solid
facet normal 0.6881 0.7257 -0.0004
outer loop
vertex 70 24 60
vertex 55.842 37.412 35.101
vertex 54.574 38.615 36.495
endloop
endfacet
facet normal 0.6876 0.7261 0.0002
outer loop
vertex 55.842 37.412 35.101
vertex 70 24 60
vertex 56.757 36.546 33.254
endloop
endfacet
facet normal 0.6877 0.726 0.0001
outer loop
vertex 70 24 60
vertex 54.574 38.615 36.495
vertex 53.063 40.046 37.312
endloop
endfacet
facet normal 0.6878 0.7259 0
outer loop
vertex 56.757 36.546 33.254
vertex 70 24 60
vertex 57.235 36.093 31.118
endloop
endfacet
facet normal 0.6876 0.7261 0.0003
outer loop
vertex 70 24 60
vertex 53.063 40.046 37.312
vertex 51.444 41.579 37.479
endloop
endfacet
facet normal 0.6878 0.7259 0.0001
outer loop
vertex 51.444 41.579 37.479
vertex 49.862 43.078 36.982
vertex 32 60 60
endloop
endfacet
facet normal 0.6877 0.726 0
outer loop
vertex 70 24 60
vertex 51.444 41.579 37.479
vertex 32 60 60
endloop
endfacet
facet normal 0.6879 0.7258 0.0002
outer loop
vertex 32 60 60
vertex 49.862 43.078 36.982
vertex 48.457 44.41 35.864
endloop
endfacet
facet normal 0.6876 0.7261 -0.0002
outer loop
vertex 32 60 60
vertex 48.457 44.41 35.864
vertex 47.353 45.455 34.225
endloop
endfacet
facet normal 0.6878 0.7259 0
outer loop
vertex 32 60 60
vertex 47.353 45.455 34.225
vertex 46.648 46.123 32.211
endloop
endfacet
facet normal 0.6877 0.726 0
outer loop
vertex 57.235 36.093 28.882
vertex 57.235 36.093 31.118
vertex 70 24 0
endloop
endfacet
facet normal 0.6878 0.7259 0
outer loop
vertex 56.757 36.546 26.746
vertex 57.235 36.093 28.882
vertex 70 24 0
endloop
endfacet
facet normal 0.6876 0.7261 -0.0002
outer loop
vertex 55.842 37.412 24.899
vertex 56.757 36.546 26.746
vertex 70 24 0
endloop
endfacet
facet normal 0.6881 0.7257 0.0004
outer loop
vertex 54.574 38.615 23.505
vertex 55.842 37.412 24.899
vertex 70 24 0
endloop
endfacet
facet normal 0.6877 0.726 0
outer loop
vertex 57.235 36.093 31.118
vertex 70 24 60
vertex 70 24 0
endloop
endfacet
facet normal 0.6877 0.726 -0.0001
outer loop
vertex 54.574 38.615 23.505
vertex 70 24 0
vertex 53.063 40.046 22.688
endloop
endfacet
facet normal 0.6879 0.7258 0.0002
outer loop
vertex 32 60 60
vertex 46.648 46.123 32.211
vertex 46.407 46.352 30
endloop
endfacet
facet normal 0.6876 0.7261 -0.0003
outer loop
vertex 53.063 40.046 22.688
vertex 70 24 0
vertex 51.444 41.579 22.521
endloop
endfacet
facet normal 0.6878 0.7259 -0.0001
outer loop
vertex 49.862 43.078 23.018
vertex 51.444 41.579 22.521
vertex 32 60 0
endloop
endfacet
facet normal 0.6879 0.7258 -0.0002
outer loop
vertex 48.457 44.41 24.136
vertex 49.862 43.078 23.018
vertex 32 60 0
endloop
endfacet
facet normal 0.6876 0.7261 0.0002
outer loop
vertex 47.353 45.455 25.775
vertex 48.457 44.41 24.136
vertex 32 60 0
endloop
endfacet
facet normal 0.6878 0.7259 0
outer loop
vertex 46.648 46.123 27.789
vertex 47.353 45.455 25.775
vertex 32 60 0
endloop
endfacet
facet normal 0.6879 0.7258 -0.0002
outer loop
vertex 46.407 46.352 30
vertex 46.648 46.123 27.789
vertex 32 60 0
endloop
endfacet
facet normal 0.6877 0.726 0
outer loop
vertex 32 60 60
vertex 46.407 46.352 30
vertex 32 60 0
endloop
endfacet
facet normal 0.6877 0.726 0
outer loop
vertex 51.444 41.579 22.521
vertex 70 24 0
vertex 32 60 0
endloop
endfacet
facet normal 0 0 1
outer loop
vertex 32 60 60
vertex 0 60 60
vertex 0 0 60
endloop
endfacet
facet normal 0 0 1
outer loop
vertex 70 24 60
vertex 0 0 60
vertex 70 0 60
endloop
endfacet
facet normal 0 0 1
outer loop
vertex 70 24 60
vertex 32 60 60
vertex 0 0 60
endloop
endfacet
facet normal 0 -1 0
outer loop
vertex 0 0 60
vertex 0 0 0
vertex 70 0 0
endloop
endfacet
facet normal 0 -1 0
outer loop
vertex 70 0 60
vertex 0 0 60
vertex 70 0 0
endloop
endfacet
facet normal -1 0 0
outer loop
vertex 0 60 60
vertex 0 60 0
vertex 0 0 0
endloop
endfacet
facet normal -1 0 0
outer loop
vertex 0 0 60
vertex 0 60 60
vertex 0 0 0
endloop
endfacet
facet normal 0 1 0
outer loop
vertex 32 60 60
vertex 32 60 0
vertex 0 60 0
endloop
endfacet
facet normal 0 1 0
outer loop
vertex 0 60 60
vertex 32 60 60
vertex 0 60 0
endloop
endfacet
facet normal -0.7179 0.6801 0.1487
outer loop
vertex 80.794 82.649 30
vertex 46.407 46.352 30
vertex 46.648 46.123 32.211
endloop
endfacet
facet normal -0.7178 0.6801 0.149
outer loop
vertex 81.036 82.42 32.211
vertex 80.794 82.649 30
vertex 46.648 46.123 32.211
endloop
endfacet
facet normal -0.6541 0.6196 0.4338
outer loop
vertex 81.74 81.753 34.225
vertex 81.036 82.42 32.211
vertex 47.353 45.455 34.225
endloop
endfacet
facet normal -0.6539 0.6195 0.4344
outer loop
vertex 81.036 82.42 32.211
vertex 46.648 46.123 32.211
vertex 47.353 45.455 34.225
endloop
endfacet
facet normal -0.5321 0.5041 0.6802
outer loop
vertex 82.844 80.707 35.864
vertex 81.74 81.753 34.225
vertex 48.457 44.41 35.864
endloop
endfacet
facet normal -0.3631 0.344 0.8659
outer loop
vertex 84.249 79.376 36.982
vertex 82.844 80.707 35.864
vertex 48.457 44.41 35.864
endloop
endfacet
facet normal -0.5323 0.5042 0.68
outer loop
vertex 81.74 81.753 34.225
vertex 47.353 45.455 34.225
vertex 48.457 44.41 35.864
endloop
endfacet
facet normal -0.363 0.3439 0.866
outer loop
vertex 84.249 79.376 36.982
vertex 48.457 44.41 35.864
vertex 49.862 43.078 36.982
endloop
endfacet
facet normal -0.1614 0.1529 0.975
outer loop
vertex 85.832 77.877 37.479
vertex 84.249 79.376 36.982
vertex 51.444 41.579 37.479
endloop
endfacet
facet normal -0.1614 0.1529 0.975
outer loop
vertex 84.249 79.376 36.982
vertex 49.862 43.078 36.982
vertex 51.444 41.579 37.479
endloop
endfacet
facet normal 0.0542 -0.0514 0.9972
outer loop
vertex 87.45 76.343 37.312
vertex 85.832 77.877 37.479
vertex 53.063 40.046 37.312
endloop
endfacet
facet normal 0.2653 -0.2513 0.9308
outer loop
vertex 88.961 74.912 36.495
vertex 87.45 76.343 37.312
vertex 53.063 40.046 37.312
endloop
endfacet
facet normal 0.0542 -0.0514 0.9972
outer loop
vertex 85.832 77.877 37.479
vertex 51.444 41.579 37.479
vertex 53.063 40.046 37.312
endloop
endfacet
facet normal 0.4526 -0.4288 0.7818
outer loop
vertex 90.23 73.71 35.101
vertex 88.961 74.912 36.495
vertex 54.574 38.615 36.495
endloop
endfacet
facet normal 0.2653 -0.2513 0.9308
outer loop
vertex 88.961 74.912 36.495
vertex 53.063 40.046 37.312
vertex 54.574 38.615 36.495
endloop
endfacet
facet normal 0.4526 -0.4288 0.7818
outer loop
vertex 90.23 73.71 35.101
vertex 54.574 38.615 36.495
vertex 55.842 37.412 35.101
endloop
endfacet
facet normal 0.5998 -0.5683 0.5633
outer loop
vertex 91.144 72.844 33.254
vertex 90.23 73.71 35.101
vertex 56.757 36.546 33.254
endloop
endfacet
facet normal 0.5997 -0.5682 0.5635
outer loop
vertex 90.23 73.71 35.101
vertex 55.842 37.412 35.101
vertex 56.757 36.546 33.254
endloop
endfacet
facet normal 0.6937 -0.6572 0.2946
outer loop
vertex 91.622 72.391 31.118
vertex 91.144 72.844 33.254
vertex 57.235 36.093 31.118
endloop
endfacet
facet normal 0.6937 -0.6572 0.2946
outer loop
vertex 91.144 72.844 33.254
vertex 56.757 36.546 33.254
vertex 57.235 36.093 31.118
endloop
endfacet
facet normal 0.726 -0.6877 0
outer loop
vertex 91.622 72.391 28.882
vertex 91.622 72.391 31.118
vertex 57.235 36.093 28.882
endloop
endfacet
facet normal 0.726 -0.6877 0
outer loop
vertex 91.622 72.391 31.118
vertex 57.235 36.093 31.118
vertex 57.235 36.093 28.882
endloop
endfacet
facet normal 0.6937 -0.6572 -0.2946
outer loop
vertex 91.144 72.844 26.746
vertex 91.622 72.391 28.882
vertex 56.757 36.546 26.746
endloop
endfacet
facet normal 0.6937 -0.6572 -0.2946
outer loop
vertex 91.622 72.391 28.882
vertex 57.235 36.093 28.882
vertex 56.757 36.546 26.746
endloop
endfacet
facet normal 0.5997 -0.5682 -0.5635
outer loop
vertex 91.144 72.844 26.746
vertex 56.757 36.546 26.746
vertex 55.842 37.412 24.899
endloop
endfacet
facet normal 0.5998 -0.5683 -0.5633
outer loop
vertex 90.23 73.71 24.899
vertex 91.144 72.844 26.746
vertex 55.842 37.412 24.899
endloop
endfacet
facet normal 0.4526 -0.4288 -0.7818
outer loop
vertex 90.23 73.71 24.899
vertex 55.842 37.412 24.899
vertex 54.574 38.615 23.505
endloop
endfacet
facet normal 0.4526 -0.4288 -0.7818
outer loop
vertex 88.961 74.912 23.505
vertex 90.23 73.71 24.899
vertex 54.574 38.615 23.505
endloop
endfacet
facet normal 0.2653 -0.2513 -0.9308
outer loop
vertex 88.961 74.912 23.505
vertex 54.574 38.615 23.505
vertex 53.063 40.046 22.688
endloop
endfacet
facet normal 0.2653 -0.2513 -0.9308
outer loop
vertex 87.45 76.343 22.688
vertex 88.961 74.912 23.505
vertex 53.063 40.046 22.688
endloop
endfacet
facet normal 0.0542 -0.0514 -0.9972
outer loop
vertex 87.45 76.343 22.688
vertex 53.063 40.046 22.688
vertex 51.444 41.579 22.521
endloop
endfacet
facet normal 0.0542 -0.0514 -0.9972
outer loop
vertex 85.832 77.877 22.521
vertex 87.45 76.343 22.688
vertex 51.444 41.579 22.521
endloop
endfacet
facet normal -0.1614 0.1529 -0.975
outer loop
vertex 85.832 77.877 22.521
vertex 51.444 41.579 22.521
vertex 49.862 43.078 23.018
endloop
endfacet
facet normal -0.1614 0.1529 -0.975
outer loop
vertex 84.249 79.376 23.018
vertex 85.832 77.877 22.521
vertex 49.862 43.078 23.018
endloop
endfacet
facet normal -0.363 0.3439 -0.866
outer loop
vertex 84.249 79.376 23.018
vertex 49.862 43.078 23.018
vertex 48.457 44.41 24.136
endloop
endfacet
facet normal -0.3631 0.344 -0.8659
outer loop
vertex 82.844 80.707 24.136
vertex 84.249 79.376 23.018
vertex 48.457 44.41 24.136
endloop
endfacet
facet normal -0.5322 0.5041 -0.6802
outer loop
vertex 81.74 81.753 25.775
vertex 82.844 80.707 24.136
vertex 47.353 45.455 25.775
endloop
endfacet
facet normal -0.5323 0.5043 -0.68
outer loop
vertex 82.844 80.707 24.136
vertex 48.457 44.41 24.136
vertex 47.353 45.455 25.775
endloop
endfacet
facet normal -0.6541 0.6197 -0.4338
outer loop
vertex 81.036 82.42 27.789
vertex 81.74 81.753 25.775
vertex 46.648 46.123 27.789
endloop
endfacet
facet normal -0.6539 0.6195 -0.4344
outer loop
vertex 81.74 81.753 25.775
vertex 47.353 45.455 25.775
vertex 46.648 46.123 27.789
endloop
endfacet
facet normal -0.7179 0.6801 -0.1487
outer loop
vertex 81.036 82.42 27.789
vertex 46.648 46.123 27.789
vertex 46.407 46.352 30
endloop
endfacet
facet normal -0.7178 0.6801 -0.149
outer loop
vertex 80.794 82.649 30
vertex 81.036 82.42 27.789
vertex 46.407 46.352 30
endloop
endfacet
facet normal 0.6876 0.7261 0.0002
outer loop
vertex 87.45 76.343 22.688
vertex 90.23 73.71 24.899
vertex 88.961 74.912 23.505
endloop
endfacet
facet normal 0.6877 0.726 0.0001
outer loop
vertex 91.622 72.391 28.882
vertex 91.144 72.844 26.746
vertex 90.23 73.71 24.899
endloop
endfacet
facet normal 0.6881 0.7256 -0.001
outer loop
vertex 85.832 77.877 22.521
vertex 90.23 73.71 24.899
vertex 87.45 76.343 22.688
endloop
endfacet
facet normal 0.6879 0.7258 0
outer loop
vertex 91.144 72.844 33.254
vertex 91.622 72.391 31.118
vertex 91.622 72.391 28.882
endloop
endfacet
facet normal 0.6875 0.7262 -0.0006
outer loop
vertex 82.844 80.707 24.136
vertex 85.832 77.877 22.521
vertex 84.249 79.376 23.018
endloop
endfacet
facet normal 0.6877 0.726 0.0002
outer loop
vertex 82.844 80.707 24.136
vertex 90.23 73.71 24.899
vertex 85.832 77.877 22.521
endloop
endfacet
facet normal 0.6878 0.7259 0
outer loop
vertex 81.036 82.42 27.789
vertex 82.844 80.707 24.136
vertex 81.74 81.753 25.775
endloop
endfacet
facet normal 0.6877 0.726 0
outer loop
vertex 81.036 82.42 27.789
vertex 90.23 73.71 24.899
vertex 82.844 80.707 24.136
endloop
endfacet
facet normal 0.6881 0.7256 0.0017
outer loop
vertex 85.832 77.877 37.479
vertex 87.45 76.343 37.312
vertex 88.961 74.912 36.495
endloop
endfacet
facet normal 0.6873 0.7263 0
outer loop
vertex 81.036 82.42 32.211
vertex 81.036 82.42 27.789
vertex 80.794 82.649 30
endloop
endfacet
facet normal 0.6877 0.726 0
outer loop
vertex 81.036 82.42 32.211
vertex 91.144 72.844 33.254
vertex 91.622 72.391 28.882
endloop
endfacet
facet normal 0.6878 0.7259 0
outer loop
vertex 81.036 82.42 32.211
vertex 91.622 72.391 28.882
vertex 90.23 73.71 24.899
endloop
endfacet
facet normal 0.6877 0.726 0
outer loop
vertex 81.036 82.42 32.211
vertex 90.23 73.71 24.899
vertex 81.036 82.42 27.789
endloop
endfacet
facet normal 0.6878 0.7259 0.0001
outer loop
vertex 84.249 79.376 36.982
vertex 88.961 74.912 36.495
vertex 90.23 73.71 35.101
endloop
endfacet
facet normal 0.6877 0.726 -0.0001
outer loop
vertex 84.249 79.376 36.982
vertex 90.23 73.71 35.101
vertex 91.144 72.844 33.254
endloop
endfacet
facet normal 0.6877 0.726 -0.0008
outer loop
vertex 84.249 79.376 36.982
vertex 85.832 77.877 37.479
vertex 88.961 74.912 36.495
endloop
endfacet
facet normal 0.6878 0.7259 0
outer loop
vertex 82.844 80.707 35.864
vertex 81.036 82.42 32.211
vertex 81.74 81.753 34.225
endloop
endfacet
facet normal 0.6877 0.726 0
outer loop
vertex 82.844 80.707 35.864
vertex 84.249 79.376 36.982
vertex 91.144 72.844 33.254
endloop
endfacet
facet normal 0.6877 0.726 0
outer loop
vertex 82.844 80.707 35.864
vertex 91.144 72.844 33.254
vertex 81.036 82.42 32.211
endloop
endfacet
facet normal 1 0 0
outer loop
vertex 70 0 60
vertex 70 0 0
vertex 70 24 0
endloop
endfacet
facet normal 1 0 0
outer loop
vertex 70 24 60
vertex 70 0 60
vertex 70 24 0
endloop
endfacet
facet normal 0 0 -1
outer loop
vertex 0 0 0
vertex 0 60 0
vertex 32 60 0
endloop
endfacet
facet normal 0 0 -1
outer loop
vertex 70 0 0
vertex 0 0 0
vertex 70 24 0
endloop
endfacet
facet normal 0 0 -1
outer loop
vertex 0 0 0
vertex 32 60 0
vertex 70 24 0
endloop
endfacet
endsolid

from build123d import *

# Parameters (mm, degrees)
EXTRUDE_1_DEPTH = 60
SKETCH_2_R      = 7.5
EXTRUDE_2_DEPTH = 50


with BuildPart() as part:
    # 草圖1 → 填料-伸長1 (new body)
    with BuildSketch(Plane.XY):
        Polygon((0, 0), (70, 0), (70, 24), (32, 60), (0, 60), align=None)
    extrude(amount=EXTRUDE_1_DEPTH)

    # 草圖2 → 填料-伸長2 (add)
    with BuildSketch(Plane(origin=(45.091970803, 47.597080292, 0), x_dir=(0.7259526839058265, -0.6877446479107832, 0), z_dir=(0.6877446479107832, 0.7259526839058265, 0))):
        with Locations(Location((9.310816324, -30, 0), (0, 0, 180))):
            Circle(SKETCH_2_R)
    extrude(amount=EXTRUDE_2_DEPTH)


solid = part.part
